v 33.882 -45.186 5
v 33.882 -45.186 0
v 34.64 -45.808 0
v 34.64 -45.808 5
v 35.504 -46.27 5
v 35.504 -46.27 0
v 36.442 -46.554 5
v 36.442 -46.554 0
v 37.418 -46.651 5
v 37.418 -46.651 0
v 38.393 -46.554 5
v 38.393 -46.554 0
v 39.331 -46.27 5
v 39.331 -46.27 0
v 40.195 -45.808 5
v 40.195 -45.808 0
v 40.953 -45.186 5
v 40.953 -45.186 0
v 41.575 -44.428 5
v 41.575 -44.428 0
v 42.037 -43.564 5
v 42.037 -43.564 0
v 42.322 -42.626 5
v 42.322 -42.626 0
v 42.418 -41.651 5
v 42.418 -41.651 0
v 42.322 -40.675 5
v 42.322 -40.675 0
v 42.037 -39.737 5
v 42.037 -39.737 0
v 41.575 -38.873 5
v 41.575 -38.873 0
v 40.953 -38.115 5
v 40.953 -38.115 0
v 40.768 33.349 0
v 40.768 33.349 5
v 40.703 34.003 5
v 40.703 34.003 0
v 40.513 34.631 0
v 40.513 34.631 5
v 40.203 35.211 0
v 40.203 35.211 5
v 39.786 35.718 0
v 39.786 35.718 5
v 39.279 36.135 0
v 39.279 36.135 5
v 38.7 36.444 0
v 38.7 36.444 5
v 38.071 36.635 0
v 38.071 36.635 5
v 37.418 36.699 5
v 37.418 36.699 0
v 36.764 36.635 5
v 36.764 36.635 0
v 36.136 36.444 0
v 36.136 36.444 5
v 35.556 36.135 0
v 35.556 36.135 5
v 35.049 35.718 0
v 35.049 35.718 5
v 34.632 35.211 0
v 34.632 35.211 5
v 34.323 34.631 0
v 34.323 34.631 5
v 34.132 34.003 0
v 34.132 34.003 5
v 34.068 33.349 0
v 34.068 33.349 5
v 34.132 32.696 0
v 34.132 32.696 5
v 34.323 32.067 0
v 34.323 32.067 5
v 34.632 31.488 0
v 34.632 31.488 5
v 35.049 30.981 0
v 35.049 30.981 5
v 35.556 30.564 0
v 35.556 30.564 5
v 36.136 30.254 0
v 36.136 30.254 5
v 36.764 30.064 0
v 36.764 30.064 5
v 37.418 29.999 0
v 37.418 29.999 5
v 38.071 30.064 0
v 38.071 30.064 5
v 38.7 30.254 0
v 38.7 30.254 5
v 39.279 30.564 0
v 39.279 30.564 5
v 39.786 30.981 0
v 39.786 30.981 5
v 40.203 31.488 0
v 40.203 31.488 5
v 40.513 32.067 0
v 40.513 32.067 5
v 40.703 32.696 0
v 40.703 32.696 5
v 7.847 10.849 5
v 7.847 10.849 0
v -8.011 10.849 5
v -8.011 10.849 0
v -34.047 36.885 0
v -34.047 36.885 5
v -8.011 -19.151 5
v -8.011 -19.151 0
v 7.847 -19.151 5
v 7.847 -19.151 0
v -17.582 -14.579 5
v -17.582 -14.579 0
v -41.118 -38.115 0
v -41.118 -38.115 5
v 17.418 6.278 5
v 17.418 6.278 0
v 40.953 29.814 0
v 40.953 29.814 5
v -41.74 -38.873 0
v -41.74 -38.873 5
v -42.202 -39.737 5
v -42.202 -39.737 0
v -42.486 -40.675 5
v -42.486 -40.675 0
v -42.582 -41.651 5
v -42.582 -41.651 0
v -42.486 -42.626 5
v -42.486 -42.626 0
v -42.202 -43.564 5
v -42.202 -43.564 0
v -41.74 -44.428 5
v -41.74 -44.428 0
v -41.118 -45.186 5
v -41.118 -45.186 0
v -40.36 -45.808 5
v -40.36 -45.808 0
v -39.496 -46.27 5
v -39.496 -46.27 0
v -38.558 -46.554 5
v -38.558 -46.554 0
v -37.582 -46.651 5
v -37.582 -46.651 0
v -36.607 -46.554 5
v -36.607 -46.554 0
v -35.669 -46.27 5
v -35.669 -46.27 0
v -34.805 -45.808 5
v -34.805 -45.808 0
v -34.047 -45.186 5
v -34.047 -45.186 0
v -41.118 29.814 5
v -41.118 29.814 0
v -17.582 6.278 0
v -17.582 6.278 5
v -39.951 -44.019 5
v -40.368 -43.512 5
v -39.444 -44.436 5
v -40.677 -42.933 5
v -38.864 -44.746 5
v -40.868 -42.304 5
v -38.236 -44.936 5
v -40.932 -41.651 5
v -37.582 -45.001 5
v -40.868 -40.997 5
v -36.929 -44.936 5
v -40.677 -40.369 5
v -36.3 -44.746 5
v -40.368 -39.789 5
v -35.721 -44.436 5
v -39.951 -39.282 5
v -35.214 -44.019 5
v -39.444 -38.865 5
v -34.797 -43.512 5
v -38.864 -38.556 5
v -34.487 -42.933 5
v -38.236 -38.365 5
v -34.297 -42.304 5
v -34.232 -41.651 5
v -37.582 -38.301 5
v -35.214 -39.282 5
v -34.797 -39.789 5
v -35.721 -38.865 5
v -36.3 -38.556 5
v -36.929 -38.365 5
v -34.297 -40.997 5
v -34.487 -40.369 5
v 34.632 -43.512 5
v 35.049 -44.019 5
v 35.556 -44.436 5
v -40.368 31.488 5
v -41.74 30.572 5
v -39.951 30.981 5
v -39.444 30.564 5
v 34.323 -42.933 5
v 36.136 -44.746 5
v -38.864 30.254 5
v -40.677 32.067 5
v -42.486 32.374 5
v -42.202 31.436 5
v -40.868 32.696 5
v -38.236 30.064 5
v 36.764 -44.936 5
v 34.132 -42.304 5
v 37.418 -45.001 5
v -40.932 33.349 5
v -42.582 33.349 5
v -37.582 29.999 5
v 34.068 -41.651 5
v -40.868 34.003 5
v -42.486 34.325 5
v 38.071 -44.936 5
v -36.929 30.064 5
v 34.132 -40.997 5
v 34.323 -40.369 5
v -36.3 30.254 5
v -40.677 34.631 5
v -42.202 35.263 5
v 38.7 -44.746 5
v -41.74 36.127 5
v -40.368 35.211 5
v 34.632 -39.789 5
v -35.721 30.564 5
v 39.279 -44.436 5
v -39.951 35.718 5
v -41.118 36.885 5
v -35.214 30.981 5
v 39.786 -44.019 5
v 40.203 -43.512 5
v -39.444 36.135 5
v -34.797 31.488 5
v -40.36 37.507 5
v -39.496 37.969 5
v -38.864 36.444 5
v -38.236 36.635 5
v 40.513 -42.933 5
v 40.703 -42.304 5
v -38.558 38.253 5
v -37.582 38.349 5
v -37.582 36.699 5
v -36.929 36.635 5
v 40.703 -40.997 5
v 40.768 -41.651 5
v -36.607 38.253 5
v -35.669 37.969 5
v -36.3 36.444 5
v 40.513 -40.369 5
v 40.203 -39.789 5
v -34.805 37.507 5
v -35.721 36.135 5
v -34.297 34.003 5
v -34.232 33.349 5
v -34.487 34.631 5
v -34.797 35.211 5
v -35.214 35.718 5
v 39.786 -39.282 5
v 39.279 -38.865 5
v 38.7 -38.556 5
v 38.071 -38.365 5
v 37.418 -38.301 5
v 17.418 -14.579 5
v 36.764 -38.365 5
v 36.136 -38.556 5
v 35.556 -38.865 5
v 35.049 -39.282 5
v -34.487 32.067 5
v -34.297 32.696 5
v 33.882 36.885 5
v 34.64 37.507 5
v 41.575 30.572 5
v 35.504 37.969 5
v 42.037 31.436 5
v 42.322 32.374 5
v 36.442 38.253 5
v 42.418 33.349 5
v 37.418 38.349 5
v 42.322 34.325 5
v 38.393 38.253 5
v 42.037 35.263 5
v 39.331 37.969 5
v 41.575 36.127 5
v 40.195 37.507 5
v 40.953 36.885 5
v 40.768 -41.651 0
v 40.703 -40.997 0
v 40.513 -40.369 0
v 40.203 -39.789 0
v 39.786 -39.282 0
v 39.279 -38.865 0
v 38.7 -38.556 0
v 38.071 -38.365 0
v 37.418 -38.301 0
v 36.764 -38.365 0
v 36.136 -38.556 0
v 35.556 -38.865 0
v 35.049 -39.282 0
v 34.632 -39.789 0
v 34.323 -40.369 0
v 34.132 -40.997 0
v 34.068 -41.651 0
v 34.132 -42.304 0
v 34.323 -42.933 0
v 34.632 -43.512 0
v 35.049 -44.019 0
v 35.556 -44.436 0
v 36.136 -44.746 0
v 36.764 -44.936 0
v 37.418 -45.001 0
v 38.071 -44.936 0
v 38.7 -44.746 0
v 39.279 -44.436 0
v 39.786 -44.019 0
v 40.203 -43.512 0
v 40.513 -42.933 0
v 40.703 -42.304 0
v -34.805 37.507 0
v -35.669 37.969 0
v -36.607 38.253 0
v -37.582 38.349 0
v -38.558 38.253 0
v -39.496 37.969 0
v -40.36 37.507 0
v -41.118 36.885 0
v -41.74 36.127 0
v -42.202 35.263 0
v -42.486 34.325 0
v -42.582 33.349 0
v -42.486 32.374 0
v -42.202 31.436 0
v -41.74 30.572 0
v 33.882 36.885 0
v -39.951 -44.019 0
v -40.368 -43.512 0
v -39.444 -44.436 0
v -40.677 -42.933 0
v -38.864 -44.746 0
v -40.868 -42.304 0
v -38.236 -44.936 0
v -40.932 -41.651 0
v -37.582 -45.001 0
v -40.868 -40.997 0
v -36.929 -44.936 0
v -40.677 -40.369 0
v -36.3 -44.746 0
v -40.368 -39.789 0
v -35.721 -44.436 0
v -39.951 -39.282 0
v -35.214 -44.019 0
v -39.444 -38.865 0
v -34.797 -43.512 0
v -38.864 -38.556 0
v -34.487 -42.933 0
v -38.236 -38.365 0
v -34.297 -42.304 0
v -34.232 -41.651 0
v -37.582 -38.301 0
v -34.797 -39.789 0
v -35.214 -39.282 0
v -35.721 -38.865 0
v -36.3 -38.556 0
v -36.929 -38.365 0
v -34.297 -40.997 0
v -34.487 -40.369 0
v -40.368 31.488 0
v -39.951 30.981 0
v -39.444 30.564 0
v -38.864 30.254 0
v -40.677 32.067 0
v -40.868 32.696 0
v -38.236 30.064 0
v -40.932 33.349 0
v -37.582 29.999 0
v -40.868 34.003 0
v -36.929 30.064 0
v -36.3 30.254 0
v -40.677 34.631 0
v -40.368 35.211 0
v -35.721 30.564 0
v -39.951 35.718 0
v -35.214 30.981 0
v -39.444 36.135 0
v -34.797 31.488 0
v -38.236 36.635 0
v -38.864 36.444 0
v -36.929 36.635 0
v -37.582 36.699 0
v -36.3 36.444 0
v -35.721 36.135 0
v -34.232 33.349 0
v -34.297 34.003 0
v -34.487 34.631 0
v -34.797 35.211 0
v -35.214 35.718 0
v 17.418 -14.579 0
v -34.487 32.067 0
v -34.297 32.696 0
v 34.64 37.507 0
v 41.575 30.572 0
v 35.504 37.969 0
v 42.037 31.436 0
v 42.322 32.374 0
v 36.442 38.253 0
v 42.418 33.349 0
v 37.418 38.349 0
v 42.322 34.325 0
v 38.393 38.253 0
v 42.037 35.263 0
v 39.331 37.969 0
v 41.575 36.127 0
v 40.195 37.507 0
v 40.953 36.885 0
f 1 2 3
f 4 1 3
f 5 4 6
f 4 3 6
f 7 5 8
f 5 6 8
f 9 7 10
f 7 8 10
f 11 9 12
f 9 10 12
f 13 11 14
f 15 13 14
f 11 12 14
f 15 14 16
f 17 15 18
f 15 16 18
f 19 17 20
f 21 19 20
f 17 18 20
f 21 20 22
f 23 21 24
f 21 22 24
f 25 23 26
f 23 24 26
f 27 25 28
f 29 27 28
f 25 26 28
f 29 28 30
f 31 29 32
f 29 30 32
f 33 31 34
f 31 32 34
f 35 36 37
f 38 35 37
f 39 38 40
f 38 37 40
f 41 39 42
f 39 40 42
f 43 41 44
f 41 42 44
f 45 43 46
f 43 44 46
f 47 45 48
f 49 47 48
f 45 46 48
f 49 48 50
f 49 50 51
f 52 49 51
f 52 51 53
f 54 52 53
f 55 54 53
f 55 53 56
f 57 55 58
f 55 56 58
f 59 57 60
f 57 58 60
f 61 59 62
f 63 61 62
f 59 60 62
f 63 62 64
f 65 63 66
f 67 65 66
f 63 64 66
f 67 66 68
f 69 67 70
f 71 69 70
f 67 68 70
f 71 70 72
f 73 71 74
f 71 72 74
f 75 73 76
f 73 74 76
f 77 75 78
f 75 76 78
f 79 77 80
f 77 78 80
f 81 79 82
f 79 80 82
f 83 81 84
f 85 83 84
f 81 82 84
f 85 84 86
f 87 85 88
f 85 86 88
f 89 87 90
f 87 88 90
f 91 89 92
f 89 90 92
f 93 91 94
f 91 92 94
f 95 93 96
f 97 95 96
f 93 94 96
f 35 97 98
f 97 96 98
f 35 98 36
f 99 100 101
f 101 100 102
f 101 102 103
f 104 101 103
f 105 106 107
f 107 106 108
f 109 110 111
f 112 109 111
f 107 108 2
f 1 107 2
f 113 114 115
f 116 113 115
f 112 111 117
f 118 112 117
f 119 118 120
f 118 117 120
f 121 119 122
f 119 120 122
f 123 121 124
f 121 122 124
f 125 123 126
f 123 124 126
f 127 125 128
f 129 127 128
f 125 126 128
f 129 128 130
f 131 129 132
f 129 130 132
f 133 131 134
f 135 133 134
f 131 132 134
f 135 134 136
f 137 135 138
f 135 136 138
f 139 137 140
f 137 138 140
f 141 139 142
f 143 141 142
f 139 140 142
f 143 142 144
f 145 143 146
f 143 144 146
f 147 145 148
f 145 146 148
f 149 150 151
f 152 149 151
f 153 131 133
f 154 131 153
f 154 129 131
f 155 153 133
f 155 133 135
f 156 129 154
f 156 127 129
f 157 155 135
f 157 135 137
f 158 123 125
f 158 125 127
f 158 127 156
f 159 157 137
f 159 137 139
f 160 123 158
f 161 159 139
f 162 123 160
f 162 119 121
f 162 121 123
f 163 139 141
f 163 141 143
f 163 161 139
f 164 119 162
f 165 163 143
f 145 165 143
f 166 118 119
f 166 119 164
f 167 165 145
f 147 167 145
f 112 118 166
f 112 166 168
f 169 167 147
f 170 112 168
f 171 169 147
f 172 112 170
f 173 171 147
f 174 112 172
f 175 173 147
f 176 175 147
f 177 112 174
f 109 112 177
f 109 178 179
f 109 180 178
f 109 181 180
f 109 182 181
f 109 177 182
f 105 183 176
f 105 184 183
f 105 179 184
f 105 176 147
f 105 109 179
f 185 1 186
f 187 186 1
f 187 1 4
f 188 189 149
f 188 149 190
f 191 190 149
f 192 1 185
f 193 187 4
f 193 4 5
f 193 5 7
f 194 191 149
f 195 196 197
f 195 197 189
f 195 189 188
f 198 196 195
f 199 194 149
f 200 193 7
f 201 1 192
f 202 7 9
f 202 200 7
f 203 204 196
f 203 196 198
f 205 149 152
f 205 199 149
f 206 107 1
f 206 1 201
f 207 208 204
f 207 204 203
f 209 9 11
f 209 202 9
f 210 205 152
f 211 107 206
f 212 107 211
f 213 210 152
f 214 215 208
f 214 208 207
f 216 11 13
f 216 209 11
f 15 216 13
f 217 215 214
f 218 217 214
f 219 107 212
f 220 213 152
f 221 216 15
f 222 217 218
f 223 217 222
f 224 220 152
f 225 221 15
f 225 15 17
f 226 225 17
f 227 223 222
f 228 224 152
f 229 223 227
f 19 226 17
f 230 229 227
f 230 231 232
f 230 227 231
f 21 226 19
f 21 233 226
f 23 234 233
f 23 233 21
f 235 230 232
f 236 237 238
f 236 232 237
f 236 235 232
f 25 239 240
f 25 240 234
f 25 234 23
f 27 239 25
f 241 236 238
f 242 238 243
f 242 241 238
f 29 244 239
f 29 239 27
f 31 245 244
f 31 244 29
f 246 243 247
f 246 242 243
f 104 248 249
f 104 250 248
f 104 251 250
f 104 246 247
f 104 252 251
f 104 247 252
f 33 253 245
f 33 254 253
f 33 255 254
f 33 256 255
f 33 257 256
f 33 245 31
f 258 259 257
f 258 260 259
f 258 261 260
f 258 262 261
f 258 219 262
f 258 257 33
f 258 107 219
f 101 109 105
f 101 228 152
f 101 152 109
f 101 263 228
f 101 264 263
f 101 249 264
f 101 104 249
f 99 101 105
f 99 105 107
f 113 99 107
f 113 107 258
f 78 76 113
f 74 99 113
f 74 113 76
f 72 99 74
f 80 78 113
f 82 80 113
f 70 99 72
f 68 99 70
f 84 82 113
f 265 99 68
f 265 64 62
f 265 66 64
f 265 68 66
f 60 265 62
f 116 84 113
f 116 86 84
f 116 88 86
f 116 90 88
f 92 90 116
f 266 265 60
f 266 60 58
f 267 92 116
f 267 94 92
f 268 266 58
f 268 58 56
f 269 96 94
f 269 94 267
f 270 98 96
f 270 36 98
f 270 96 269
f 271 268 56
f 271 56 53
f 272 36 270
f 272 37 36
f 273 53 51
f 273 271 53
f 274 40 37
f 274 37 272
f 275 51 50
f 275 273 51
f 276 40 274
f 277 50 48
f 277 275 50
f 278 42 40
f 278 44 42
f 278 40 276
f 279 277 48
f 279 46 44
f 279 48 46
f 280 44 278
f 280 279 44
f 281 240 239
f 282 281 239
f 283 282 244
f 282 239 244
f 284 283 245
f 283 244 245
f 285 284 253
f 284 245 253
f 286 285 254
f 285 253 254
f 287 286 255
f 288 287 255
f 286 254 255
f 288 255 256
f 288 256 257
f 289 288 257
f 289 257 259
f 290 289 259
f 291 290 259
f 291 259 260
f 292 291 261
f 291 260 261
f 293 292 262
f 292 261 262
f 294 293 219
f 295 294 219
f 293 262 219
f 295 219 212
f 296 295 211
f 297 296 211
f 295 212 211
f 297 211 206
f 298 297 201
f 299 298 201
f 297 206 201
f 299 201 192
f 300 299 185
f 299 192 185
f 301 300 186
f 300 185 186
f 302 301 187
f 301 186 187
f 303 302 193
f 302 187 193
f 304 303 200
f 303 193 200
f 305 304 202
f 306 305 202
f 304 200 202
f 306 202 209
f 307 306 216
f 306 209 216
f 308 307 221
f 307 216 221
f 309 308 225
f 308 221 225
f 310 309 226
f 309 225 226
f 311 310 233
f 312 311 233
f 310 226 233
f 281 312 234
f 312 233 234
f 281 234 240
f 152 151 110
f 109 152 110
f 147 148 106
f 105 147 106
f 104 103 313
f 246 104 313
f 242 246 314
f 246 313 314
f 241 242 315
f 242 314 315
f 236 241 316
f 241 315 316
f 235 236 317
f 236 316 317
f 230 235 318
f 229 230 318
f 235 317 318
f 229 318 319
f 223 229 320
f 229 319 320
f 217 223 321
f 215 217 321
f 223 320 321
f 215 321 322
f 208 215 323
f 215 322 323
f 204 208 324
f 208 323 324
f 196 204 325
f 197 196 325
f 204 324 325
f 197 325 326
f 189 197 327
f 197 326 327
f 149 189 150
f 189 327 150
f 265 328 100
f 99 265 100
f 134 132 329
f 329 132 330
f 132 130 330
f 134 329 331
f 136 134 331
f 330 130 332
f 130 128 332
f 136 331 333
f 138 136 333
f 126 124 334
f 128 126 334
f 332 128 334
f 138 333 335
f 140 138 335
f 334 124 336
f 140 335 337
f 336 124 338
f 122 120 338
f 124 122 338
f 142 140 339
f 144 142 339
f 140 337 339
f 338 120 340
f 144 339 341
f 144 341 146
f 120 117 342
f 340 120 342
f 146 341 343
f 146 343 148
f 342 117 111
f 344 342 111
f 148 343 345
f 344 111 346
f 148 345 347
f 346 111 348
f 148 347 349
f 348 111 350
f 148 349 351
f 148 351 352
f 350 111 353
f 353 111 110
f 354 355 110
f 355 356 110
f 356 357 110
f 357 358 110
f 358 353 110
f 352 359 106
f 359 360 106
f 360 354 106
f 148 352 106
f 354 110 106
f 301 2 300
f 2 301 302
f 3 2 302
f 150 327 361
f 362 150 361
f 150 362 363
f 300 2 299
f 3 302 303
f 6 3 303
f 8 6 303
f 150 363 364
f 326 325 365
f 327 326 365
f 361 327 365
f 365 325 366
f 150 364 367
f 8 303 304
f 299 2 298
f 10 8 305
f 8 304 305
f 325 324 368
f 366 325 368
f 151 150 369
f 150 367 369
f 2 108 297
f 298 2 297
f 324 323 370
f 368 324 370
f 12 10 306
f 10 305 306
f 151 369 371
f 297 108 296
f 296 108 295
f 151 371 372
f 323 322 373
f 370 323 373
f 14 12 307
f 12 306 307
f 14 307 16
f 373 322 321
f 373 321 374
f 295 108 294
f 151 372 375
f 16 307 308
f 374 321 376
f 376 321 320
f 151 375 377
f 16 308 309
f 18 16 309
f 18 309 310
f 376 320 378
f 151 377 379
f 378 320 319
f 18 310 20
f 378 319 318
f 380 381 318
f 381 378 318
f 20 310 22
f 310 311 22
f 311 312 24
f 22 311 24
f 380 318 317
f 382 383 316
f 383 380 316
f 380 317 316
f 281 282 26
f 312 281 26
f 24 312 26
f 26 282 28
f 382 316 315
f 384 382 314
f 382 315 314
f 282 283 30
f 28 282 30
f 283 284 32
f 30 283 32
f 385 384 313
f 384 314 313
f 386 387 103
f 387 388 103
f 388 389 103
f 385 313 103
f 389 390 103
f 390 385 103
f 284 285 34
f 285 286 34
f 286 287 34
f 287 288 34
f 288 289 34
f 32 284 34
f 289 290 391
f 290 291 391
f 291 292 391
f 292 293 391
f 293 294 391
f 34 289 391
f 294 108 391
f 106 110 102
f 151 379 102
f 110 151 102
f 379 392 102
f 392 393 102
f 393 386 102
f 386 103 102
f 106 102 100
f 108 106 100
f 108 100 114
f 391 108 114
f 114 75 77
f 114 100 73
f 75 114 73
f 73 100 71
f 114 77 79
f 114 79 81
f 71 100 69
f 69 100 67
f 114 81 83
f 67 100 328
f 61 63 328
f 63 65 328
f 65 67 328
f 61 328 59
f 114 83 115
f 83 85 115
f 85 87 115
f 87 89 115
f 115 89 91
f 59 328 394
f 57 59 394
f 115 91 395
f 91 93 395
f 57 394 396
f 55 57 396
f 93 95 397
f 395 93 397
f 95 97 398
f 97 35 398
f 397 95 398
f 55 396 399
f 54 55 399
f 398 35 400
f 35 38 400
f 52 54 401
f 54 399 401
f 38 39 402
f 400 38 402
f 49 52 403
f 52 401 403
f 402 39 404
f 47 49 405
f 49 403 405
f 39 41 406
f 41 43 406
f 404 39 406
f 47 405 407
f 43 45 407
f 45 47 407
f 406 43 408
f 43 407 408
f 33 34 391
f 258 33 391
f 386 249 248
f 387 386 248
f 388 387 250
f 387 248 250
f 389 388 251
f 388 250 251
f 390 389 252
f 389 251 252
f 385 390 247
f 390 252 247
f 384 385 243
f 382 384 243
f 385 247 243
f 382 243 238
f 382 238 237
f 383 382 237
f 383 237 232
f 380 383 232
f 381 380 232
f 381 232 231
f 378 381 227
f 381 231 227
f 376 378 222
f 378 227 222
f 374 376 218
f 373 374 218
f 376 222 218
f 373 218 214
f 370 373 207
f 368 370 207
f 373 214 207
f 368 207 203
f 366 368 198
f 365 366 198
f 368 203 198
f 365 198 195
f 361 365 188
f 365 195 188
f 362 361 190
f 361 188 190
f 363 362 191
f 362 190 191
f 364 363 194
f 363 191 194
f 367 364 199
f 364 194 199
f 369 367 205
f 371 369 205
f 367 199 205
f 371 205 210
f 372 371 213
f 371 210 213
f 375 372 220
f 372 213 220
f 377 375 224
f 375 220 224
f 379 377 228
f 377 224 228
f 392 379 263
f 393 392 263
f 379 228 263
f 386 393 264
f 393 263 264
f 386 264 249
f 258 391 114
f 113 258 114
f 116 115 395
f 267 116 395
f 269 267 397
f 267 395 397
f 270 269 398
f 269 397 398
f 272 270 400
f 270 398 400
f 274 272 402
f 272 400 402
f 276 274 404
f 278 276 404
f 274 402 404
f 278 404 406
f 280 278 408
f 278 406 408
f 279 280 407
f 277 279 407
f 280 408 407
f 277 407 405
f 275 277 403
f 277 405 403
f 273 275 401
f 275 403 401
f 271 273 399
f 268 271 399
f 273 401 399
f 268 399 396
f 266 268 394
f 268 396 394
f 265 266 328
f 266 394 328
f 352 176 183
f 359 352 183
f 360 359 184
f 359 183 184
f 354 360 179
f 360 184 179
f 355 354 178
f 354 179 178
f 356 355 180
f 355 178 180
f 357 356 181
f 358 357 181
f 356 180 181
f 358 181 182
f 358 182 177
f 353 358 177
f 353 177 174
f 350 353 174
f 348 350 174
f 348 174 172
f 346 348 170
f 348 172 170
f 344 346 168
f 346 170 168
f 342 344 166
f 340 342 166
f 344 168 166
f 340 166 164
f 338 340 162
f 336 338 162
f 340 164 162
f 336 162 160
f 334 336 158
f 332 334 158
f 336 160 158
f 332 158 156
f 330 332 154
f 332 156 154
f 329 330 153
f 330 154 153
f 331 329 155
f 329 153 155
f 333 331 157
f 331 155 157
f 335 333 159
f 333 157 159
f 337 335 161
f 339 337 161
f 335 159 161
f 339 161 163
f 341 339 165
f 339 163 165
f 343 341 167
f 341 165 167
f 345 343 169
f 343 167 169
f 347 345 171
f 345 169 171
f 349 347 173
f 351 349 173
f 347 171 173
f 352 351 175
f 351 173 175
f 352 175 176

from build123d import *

# Parameters (mm, degrees)
EXTRUDE_1_DEPTH     = 5
SKETCH_4_R          = 3.35
CUT_EXTRUDE_1_DEPTH = 5


with BuildPart() as part:
    # 草图1 → 凸台-拉伸1 (new body)
    with BuildSketch(Plane.XY):
        with BuildLine():
            Line((33.882068439, 36.885004962), (7.846534534, 10.849471056))
            Line((7.846534534, 10.849471056), (-8.011329843, 10.849471056))
            Line((-8.011329843, 10.849471056), (-34.046863749, 36.885004962))
            ThreePointArc((-34.046863749, 36.885004962), (-41.117931561, 36.885004962), (-41.117931561, 29.81393715))
            Line((-41.117931561, 29.81393715), (-17.582397655, 6.278403244))
            Line((-17.582397655, 6.278403244), (-17.582397655, -14.579461132))
            Line((-17.582397655, -14.579461132), (-41.117931561, -38.114995038))
            ThreePointArc((-41.117931561, -38.114995038), (-41.117931561, -45.18606285), (-34.046863749, -45.18606285))
            Line((-34.046863749, -45.18606285), (-8.011329843, -19.150528944))
            Line((-8.011329843, -19.150528944), (7.846534534, -19.150528944))
            Line((7.846534534, -19.150528944), (33.882068439, -45.18606285))
            ThreePointArc((33.882068439, -45.18606285), (40.953136251, -45.18606285), (40.953136251, -38.114995038))
            Line((40.953136251, -38.114995038), (17.417602345, -14.579461132))
            Line((17.417602345, -14.579461132), (17.417602345, 6.278403244))
            Line((17.417602345, 6.278403244), (40.953136251, 29.81393715))
            ThreePointArc((40.953136251, 29.81393715), (40.953136251, 36.885004962), (33.882068439, 36.885004962))
        make_face()
    extrude(amount=EXTRUDE_1_DEPTH)

    # 草图4 → 切除-拉伸1 (cut)
    with BuildSketch(Plane.XY.offset(5)):
        with Locations((-37.582397655, 33.349471056)):
            Circle(SKETCH_4_R)
        with Locations((37.417602345, 33.349471056)):
            Circle(SKETCH_4_R)
        with Locations((37.417602345, -41.650528944)):
            Circle(SKETCH_4_R)
        with Locations((-37.582397655, -41.650528944)):
            Circle(SKETCH_4_R)
    extrude(amount=-CUT_EXTRUDE_1_DEPTH, mode=Mode.SUBTRACT)


solid = part.part
